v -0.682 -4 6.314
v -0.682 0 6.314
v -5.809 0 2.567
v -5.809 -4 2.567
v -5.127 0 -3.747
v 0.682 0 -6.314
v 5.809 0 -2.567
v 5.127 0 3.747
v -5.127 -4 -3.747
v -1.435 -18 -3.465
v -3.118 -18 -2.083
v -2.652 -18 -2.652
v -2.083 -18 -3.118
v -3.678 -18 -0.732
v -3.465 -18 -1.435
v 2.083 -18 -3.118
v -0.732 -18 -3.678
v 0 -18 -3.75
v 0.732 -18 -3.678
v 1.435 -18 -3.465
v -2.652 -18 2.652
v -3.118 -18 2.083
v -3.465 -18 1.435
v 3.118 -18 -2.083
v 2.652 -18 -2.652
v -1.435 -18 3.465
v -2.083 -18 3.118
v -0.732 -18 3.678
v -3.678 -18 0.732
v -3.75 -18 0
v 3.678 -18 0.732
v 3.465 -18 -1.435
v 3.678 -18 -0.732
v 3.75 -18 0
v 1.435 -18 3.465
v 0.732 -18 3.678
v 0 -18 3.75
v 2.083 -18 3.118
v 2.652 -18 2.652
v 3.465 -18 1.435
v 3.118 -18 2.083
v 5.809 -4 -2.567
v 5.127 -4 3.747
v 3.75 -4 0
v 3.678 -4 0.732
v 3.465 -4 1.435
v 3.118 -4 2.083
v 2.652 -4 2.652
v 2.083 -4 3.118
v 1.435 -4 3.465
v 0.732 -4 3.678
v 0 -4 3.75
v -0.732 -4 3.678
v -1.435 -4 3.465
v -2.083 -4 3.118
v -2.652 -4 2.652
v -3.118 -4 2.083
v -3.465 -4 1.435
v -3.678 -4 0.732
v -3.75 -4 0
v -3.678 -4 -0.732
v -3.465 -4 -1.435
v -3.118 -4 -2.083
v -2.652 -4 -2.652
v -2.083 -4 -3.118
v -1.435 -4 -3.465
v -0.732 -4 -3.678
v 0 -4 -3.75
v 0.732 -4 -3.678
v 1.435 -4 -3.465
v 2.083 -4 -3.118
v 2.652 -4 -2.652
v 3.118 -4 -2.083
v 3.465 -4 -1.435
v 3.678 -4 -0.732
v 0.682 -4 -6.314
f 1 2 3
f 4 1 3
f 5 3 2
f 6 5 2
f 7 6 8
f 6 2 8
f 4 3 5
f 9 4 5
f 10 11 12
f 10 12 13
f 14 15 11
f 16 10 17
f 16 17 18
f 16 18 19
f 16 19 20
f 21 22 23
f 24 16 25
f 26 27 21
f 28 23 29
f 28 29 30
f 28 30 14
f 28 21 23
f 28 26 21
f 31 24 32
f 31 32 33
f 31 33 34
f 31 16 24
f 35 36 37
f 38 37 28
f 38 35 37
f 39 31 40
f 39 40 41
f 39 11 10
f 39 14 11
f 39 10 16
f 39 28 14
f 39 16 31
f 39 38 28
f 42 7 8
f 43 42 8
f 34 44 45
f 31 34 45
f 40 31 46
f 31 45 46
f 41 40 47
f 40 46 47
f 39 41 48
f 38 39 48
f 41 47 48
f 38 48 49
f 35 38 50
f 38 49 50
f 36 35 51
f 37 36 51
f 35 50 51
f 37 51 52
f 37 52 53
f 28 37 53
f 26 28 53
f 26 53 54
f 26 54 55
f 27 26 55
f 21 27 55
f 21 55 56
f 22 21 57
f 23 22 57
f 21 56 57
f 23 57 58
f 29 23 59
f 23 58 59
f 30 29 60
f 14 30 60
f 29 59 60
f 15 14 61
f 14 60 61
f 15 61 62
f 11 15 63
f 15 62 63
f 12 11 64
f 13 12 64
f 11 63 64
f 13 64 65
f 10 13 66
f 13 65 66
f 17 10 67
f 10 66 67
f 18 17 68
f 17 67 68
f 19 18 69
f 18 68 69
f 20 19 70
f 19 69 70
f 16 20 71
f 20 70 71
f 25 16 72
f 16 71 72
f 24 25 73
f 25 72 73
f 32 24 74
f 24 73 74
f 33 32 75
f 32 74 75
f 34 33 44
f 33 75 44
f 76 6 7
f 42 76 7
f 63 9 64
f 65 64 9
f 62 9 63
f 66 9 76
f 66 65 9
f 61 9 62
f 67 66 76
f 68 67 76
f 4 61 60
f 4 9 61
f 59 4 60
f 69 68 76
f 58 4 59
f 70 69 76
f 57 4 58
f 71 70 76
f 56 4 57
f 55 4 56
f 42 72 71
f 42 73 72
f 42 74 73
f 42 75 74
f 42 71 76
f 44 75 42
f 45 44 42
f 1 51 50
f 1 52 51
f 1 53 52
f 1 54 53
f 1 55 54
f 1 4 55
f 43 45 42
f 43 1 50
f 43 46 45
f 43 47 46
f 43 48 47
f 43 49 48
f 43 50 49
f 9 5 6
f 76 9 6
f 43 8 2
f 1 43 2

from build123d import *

# Parameters (mm, degrees)
F1_DEPTH = 4
F2_R     = 3.75
F3_DEPTH = 14


# Not quite as in the source:
# - a feature names something its author has since deleted; it is built from what else it names


with BuildPart() as f1:
    # F0 (on Front) → F1 (new body)
    with BuildSketch(Plane.XZ):
        Polygon((0.6816548843, -6.3141650241), (5.8090547568, -2.5667520656), (5.1273998724, 3.7474129585), (-0.6816548843, 6.3141650241), (-5.8090547568, 2.5667520656), (-5.1273998724, -3.7474129585), align=None)
    extrude(amount=F1_DEPTH)

    # F2 (on face) → F3 (join)
    with BuildSketch(Plane.XZ.offset(4)):
        Circle(F2_R)
    extrude(amount=F3_DEPTH)


solid = f1.part
